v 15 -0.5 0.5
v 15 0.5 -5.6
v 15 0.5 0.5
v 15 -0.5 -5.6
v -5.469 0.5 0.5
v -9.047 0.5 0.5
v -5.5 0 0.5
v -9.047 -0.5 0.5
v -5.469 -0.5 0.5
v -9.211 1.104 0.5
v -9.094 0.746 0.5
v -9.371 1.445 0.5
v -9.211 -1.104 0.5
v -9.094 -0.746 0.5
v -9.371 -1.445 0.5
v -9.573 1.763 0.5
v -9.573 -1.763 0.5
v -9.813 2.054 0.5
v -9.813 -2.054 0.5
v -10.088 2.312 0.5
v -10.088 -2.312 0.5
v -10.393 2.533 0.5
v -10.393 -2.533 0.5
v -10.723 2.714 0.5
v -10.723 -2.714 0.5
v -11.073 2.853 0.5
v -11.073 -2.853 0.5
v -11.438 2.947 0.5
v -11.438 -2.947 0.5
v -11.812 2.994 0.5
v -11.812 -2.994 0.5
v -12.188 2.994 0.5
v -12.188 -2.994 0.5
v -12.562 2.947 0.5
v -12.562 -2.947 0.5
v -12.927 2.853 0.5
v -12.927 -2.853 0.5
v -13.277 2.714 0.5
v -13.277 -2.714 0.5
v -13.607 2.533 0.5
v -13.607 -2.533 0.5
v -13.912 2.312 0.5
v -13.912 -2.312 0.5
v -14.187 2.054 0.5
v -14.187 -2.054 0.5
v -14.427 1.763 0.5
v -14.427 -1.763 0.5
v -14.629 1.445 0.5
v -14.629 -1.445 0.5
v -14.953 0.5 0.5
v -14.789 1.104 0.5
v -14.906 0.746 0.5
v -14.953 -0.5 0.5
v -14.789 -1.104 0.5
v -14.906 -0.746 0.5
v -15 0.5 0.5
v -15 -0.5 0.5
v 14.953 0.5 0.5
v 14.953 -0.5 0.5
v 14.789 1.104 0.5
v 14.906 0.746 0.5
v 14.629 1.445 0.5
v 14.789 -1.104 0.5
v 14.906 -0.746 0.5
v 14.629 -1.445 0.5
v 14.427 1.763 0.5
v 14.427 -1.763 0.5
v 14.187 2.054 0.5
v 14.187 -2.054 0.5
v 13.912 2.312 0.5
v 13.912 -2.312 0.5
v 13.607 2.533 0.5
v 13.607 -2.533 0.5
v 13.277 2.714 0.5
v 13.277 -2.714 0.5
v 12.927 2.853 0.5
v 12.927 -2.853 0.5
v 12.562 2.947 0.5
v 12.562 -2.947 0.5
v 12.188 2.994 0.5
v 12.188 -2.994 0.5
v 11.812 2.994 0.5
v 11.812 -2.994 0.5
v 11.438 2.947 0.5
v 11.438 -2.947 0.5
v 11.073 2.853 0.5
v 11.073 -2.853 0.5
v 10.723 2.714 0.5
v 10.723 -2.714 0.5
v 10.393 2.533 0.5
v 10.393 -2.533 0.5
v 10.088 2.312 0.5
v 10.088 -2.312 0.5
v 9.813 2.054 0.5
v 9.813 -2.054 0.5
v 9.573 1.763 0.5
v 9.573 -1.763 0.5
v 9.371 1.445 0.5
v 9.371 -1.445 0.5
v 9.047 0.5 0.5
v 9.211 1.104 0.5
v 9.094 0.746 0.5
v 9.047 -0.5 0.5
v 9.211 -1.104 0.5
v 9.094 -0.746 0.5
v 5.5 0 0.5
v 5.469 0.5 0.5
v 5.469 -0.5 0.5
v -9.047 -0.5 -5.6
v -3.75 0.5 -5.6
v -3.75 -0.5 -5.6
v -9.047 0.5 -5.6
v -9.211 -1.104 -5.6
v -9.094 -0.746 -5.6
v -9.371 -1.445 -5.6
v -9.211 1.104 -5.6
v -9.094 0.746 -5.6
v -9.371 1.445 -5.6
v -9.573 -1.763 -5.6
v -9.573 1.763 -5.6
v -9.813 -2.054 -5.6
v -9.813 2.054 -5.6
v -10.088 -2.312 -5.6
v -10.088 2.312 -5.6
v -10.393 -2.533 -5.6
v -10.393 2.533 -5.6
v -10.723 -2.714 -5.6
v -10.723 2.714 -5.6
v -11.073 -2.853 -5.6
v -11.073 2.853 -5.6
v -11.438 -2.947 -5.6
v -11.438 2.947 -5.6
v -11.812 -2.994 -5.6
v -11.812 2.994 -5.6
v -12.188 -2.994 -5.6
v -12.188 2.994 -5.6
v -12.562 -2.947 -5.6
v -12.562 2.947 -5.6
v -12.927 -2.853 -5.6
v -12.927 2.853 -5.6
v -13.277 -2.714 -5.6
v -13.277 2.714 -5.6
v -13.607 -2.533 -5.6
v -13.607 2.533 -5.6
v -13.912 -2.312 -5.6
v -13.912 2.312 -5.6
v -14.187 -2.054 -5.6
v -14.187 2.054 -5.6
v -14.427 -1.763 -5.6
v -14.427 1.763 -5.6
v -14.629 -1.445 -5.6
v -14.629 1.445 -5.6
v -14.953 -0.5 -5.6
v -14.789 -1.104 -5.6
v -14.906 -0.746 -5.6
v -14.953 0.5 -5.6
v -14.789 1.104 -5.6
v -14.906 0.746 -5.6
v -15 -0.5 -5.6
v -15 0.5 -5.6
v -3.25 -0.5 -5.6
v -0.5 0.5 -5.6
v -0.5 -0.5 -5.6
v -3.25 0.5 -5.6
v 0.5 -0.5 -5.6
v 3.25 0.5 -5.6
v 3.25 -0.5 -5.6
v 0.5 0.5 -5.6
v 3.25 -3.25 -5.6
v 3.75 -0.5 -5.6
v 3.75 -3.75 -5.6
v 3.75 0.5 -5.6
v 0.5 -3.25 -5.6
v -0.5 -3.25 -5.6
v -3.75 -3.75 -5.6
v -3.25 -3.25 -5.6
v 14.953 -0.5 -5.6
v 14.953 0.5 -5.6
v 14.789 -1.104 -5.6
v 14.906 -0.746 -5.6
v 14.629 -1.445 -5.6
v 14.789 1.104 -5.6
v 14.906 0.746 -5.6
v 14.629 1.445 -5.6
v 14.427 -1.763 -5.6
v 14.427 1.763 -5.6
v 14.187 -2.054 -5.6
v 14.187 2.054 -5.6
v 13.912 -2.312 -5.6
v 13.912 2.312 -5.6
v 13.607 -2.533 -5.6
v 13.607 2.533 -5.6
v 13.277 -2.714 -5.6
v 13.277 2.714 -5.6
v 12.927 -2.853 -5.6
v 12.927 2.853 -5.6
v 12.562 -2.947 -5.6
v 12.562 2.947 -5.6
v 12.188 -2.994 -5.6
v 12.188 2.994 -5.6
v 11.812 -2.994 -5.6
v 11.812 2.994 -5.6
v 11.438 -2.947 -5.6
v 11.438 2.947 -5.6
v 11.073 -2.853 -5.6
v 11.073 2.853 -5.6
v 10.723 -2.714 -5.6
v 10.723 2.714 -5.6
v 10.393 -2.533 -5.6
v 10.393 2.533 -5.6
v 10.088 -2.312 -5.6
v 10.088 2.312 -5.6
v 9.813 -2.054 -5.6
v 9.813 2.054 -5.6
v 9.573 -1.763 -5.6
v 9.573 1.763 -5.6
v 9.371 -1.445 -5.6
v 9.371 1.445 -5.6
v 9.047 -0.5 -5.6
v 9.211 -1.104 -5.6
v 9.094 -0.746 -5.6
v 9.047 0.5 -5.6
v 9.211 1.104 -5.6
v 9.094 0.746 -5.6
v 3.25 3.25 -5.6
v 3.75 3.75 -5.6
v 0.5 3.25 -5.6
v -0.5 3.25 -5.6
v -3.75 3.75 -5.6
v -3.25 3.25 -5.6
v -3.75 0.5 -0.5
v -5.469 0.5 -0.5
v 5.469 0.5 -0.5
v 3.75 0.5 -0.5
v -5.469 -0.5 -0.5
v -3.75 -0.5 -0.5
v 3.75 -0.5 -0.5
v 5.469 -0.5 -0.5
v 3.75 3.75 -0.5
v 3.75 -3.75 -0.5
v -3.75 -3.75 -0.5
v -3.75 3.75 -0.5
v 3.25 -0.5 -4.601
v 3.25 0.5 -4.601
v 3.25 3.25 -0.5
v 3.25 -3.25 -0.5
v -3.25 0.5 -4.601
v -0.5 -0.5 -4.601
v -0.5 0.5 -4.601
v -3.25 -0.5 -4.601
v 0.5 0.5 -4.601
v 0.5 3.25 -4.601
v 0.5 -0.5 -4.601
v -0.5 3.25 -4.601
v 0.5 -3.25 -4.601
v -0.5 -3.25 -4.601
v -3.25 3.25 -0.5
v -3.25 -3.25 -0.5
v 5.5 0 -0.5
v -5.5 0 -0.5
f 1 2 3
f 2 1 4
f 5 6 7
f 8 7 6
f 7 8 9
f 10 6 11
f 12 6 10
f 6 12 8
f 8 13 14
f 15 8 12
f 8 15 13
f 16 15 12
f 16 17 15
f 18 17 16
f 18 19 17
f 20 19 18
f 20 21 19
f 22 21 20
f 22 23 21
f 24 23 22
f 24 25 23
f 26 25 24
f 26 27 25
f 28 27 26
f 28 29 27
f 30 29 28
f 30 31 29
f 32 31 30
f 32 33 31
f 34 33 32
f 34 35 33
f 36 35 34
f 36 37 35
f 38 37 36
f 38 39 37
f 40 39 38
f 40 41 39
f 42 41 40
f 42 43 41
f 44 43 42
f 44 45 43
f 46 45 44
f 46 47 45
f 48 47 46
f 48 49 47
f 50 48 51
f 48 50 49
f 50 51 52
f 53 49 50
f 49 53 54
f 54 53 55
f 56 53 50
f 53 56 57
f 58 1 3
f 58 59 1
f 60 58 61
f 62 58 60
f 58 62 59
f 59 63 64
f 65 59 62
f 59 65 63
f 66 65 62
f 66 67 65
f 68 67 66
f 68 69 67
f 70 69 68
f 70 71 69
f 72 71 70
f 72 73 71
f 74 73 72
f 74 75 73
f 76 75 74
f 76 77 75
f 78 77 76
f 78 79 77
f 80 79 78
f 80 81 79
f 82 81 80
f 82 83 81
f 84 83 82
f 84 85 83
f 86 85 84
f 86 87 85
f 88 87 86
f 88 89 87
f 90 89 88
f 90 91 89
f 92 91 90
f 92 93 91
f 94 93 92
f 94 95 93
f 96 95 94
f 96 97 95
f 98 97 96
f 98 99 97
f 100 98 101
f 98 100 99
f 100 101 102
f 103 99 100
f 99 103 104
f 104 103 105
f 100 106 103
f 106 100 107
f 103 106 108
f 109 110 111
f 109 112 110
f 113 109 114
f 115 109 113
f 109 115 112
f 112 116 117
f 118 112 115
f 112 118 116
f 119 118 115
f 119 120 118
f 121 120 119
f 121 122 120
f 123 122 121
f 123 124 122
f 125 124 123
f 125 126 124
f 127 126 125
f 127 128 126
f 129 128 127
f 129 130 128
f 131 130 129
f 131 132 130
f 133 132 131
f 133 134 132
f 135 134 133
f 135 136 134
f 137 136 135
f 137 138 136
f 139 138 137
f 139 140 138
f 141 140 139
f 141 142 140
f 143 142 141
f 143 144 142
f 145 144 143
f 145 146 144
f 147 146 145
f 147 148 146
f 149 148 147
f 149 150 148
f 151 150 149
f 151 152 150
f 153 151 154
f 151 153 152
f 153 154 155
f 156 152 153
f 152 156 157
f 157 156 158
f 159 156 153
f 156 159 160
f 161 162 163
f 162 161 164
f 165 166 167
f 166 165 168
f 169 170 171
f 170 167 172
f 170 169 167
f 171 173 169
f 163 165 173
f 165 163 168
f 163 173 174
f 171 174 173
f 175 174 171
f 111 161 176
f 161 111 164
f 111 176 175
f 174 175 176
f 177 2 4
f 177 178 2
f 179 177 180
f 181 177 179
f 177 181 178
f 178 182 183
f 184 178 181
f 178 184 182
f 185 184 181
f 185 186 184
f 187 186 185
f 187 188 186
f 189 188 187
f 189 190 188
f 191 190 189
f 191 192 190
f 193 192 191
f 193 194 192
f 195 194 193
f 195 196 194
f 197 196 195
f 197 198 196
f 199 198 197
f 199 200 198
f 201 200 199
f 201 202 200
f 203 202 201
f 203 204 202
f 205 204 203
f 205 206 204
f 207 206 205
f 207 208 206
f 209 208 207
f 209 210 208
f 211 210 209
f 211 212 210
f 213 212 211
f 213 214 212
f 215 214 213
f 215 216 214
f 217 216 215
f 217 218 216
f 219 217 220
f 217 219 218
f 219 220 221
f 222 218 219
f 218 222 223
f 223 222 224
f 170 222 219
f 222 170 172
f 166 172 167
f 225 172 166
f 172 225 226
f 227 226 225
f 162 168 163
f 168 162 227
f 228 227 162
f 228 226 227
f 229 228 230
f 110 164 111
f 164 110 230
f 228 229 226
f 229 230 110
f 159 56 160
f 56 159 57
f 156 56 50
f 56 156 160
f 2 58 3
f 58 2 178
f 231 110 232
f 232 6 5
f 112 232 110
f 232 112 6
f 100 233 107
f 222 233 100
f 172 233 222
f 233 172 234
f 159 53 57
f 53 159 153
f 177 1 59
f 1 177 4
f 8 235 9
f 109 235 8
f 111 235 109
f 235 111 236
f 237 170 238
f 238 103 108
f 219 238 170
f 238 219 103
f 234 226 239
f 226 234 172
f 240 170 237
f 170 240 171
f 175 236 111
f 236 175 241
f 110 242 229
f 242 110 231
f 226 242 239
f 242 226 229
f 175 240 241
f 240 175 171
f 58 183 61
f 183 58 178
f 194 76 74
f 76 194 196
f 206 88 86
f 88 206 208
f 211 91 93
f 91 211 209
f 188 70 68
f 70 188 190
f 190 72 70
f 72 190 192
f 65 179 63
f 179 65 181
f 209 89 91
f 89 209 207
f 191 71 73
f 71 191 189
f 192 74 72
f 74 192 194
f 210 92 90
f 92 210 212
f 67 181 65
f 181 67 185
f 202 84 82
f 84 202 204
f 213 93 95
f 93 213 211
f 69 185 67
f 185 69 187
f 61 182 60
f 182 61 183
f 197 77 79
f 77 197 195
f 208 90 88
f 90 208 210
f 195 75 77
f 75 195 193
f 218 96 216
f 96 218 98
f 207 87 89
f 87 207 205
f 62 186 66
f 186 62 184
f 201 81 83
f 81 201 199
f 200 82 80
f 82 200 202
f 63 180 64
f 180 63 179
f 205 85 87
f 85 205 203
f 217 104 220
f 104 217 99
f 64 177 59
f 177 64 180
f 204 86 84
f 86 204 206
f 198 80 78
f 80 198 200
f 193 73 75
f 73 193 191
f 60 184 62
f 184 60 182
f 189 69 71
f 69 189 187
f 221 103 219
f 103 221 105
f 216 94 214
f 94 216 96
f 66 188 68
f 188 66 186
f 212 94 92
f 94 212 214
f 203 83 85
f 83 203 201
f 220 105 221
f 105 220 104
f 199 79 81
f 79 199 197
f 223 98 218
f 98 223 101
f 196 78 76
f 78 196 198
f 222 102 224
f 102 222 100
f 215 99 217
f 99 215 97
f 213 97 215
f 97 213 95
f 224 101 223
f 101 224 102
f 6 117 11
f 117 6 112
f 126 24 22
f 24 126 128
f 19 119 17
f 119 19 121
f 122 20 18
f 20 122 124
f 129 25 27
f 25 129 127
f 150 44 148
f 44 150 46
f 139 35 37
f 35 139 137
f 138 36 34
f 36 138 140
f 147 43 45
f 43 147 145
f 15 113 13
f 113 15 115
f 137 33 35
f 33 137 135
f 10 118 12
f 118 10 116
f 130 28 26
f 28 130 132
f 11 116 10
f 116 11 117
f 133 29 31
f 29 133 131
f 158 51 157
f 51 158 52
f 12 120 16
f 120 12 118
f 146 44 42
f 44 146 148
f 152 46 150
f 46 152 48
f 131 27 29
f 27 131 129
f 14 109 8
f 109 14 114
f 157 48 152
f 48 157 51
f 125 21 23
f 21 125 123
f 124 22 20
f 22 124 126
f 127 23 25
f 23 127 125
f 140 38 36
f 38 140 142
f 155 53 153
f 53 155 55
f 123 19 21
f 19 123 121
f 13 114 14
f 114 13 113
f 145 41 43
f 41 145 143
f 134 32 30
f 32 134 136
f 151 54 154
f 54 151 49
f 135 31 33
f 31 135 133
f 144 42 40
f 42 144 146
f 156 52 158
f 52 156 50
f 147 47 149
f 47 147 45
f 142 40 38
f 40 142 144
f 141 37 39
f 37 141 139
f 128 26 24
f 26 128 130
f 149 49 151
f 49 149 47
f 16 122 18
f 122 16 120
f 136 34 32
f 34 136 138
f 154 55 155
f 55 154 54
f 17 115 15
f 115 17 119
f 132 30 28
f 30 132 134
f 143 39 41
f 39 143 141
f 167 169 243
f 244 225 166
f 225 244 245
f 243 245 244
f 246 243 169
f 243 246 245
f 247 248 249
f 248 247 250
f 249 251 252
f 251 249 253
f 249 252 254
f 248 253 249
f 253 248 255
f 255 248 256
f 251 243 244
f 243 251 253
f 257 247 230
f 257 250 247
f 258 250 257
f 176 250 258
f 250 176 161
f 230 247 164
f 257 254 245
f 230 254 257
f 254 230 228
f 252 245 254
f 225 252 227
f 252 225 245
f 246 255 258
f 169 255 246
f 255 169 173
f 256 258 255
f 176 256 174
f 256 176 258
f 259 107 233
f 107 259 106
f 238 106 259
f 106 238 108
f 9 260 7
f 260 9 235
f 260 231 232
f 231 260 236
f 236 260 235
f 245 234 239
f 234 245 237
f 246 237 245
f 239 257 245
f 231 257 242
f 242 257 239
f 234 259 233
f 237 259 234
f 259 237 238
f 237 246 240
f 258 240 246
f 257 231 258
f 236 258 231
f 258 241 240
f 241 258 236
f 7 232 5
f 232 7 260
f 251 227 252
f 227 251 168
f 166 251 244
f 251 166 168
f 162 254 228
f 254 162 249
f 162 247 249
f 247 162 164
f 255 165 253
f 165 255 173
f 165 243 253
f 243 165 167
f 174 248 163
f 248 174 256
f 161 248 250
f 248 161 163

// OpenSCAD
/* Simple button attachment */

$fn = 50;

mode = "base"; // ["cap", "base", "all"]
tolerance = 0.4;

base_width = 6;
base_depth = 6;
base_height= 3;
button_diameter = 3.4;
button_height = 2;

movement = 0.4;


module button() {
  translate([0,0,-0.001]) {
    union() {
      translate([-base_width/2, -base_depth/2, 0])
        cube([base_width,base_depth,base_height]);
      translate([0,0,base_height - 0.001])
        cylinder(h=button_height,r=button_diameter/2);
    }
  }
}
if (mode == "cap" || mode == "all") {
  union() {
    cylinder(h=5, r=3.5);
    cylinder(h=.5, r=5);
  }
 }
if (mode == "base" || mode == "all") {
  translate([0,0,-2.5])
  difference() {
    union() {
      translate([-15, -.5, -3.1])
        cube([30, 1, 6.1]);
      translate([-3.75, -3.75, -3.1])
        cube([7.5,7.5,6.1]);
      translate([12,0,-3.1])
        cylinder(h=6.1,r=3);
      translate([-12,0,-3.1])
        cylinder(h=6.1,r=3);
    }
    translate([-3.25, -3.25, -2.101])
      cube([6.5, 6.5, 5]);
    translate([0,0,2])
    cylinder(h=1.01, r=5.5);
    translate([0.5,0.5,-3.2])
      cube([2.75,2.75,5]);
    translate([-3.25,0.5,-3.2])
      cube([2.75,2.75,5]);
    translate([0.5,-3.25,-3.2])
      cube([2.75,2.75,5]);
    translate([-3.25,-3.25,-3.2])
      cube([2.75,2.75,5]);
  }
 }

if (mode == "all") {
  translate([0,0,-4.6])
    color("gray")
    button();
}
